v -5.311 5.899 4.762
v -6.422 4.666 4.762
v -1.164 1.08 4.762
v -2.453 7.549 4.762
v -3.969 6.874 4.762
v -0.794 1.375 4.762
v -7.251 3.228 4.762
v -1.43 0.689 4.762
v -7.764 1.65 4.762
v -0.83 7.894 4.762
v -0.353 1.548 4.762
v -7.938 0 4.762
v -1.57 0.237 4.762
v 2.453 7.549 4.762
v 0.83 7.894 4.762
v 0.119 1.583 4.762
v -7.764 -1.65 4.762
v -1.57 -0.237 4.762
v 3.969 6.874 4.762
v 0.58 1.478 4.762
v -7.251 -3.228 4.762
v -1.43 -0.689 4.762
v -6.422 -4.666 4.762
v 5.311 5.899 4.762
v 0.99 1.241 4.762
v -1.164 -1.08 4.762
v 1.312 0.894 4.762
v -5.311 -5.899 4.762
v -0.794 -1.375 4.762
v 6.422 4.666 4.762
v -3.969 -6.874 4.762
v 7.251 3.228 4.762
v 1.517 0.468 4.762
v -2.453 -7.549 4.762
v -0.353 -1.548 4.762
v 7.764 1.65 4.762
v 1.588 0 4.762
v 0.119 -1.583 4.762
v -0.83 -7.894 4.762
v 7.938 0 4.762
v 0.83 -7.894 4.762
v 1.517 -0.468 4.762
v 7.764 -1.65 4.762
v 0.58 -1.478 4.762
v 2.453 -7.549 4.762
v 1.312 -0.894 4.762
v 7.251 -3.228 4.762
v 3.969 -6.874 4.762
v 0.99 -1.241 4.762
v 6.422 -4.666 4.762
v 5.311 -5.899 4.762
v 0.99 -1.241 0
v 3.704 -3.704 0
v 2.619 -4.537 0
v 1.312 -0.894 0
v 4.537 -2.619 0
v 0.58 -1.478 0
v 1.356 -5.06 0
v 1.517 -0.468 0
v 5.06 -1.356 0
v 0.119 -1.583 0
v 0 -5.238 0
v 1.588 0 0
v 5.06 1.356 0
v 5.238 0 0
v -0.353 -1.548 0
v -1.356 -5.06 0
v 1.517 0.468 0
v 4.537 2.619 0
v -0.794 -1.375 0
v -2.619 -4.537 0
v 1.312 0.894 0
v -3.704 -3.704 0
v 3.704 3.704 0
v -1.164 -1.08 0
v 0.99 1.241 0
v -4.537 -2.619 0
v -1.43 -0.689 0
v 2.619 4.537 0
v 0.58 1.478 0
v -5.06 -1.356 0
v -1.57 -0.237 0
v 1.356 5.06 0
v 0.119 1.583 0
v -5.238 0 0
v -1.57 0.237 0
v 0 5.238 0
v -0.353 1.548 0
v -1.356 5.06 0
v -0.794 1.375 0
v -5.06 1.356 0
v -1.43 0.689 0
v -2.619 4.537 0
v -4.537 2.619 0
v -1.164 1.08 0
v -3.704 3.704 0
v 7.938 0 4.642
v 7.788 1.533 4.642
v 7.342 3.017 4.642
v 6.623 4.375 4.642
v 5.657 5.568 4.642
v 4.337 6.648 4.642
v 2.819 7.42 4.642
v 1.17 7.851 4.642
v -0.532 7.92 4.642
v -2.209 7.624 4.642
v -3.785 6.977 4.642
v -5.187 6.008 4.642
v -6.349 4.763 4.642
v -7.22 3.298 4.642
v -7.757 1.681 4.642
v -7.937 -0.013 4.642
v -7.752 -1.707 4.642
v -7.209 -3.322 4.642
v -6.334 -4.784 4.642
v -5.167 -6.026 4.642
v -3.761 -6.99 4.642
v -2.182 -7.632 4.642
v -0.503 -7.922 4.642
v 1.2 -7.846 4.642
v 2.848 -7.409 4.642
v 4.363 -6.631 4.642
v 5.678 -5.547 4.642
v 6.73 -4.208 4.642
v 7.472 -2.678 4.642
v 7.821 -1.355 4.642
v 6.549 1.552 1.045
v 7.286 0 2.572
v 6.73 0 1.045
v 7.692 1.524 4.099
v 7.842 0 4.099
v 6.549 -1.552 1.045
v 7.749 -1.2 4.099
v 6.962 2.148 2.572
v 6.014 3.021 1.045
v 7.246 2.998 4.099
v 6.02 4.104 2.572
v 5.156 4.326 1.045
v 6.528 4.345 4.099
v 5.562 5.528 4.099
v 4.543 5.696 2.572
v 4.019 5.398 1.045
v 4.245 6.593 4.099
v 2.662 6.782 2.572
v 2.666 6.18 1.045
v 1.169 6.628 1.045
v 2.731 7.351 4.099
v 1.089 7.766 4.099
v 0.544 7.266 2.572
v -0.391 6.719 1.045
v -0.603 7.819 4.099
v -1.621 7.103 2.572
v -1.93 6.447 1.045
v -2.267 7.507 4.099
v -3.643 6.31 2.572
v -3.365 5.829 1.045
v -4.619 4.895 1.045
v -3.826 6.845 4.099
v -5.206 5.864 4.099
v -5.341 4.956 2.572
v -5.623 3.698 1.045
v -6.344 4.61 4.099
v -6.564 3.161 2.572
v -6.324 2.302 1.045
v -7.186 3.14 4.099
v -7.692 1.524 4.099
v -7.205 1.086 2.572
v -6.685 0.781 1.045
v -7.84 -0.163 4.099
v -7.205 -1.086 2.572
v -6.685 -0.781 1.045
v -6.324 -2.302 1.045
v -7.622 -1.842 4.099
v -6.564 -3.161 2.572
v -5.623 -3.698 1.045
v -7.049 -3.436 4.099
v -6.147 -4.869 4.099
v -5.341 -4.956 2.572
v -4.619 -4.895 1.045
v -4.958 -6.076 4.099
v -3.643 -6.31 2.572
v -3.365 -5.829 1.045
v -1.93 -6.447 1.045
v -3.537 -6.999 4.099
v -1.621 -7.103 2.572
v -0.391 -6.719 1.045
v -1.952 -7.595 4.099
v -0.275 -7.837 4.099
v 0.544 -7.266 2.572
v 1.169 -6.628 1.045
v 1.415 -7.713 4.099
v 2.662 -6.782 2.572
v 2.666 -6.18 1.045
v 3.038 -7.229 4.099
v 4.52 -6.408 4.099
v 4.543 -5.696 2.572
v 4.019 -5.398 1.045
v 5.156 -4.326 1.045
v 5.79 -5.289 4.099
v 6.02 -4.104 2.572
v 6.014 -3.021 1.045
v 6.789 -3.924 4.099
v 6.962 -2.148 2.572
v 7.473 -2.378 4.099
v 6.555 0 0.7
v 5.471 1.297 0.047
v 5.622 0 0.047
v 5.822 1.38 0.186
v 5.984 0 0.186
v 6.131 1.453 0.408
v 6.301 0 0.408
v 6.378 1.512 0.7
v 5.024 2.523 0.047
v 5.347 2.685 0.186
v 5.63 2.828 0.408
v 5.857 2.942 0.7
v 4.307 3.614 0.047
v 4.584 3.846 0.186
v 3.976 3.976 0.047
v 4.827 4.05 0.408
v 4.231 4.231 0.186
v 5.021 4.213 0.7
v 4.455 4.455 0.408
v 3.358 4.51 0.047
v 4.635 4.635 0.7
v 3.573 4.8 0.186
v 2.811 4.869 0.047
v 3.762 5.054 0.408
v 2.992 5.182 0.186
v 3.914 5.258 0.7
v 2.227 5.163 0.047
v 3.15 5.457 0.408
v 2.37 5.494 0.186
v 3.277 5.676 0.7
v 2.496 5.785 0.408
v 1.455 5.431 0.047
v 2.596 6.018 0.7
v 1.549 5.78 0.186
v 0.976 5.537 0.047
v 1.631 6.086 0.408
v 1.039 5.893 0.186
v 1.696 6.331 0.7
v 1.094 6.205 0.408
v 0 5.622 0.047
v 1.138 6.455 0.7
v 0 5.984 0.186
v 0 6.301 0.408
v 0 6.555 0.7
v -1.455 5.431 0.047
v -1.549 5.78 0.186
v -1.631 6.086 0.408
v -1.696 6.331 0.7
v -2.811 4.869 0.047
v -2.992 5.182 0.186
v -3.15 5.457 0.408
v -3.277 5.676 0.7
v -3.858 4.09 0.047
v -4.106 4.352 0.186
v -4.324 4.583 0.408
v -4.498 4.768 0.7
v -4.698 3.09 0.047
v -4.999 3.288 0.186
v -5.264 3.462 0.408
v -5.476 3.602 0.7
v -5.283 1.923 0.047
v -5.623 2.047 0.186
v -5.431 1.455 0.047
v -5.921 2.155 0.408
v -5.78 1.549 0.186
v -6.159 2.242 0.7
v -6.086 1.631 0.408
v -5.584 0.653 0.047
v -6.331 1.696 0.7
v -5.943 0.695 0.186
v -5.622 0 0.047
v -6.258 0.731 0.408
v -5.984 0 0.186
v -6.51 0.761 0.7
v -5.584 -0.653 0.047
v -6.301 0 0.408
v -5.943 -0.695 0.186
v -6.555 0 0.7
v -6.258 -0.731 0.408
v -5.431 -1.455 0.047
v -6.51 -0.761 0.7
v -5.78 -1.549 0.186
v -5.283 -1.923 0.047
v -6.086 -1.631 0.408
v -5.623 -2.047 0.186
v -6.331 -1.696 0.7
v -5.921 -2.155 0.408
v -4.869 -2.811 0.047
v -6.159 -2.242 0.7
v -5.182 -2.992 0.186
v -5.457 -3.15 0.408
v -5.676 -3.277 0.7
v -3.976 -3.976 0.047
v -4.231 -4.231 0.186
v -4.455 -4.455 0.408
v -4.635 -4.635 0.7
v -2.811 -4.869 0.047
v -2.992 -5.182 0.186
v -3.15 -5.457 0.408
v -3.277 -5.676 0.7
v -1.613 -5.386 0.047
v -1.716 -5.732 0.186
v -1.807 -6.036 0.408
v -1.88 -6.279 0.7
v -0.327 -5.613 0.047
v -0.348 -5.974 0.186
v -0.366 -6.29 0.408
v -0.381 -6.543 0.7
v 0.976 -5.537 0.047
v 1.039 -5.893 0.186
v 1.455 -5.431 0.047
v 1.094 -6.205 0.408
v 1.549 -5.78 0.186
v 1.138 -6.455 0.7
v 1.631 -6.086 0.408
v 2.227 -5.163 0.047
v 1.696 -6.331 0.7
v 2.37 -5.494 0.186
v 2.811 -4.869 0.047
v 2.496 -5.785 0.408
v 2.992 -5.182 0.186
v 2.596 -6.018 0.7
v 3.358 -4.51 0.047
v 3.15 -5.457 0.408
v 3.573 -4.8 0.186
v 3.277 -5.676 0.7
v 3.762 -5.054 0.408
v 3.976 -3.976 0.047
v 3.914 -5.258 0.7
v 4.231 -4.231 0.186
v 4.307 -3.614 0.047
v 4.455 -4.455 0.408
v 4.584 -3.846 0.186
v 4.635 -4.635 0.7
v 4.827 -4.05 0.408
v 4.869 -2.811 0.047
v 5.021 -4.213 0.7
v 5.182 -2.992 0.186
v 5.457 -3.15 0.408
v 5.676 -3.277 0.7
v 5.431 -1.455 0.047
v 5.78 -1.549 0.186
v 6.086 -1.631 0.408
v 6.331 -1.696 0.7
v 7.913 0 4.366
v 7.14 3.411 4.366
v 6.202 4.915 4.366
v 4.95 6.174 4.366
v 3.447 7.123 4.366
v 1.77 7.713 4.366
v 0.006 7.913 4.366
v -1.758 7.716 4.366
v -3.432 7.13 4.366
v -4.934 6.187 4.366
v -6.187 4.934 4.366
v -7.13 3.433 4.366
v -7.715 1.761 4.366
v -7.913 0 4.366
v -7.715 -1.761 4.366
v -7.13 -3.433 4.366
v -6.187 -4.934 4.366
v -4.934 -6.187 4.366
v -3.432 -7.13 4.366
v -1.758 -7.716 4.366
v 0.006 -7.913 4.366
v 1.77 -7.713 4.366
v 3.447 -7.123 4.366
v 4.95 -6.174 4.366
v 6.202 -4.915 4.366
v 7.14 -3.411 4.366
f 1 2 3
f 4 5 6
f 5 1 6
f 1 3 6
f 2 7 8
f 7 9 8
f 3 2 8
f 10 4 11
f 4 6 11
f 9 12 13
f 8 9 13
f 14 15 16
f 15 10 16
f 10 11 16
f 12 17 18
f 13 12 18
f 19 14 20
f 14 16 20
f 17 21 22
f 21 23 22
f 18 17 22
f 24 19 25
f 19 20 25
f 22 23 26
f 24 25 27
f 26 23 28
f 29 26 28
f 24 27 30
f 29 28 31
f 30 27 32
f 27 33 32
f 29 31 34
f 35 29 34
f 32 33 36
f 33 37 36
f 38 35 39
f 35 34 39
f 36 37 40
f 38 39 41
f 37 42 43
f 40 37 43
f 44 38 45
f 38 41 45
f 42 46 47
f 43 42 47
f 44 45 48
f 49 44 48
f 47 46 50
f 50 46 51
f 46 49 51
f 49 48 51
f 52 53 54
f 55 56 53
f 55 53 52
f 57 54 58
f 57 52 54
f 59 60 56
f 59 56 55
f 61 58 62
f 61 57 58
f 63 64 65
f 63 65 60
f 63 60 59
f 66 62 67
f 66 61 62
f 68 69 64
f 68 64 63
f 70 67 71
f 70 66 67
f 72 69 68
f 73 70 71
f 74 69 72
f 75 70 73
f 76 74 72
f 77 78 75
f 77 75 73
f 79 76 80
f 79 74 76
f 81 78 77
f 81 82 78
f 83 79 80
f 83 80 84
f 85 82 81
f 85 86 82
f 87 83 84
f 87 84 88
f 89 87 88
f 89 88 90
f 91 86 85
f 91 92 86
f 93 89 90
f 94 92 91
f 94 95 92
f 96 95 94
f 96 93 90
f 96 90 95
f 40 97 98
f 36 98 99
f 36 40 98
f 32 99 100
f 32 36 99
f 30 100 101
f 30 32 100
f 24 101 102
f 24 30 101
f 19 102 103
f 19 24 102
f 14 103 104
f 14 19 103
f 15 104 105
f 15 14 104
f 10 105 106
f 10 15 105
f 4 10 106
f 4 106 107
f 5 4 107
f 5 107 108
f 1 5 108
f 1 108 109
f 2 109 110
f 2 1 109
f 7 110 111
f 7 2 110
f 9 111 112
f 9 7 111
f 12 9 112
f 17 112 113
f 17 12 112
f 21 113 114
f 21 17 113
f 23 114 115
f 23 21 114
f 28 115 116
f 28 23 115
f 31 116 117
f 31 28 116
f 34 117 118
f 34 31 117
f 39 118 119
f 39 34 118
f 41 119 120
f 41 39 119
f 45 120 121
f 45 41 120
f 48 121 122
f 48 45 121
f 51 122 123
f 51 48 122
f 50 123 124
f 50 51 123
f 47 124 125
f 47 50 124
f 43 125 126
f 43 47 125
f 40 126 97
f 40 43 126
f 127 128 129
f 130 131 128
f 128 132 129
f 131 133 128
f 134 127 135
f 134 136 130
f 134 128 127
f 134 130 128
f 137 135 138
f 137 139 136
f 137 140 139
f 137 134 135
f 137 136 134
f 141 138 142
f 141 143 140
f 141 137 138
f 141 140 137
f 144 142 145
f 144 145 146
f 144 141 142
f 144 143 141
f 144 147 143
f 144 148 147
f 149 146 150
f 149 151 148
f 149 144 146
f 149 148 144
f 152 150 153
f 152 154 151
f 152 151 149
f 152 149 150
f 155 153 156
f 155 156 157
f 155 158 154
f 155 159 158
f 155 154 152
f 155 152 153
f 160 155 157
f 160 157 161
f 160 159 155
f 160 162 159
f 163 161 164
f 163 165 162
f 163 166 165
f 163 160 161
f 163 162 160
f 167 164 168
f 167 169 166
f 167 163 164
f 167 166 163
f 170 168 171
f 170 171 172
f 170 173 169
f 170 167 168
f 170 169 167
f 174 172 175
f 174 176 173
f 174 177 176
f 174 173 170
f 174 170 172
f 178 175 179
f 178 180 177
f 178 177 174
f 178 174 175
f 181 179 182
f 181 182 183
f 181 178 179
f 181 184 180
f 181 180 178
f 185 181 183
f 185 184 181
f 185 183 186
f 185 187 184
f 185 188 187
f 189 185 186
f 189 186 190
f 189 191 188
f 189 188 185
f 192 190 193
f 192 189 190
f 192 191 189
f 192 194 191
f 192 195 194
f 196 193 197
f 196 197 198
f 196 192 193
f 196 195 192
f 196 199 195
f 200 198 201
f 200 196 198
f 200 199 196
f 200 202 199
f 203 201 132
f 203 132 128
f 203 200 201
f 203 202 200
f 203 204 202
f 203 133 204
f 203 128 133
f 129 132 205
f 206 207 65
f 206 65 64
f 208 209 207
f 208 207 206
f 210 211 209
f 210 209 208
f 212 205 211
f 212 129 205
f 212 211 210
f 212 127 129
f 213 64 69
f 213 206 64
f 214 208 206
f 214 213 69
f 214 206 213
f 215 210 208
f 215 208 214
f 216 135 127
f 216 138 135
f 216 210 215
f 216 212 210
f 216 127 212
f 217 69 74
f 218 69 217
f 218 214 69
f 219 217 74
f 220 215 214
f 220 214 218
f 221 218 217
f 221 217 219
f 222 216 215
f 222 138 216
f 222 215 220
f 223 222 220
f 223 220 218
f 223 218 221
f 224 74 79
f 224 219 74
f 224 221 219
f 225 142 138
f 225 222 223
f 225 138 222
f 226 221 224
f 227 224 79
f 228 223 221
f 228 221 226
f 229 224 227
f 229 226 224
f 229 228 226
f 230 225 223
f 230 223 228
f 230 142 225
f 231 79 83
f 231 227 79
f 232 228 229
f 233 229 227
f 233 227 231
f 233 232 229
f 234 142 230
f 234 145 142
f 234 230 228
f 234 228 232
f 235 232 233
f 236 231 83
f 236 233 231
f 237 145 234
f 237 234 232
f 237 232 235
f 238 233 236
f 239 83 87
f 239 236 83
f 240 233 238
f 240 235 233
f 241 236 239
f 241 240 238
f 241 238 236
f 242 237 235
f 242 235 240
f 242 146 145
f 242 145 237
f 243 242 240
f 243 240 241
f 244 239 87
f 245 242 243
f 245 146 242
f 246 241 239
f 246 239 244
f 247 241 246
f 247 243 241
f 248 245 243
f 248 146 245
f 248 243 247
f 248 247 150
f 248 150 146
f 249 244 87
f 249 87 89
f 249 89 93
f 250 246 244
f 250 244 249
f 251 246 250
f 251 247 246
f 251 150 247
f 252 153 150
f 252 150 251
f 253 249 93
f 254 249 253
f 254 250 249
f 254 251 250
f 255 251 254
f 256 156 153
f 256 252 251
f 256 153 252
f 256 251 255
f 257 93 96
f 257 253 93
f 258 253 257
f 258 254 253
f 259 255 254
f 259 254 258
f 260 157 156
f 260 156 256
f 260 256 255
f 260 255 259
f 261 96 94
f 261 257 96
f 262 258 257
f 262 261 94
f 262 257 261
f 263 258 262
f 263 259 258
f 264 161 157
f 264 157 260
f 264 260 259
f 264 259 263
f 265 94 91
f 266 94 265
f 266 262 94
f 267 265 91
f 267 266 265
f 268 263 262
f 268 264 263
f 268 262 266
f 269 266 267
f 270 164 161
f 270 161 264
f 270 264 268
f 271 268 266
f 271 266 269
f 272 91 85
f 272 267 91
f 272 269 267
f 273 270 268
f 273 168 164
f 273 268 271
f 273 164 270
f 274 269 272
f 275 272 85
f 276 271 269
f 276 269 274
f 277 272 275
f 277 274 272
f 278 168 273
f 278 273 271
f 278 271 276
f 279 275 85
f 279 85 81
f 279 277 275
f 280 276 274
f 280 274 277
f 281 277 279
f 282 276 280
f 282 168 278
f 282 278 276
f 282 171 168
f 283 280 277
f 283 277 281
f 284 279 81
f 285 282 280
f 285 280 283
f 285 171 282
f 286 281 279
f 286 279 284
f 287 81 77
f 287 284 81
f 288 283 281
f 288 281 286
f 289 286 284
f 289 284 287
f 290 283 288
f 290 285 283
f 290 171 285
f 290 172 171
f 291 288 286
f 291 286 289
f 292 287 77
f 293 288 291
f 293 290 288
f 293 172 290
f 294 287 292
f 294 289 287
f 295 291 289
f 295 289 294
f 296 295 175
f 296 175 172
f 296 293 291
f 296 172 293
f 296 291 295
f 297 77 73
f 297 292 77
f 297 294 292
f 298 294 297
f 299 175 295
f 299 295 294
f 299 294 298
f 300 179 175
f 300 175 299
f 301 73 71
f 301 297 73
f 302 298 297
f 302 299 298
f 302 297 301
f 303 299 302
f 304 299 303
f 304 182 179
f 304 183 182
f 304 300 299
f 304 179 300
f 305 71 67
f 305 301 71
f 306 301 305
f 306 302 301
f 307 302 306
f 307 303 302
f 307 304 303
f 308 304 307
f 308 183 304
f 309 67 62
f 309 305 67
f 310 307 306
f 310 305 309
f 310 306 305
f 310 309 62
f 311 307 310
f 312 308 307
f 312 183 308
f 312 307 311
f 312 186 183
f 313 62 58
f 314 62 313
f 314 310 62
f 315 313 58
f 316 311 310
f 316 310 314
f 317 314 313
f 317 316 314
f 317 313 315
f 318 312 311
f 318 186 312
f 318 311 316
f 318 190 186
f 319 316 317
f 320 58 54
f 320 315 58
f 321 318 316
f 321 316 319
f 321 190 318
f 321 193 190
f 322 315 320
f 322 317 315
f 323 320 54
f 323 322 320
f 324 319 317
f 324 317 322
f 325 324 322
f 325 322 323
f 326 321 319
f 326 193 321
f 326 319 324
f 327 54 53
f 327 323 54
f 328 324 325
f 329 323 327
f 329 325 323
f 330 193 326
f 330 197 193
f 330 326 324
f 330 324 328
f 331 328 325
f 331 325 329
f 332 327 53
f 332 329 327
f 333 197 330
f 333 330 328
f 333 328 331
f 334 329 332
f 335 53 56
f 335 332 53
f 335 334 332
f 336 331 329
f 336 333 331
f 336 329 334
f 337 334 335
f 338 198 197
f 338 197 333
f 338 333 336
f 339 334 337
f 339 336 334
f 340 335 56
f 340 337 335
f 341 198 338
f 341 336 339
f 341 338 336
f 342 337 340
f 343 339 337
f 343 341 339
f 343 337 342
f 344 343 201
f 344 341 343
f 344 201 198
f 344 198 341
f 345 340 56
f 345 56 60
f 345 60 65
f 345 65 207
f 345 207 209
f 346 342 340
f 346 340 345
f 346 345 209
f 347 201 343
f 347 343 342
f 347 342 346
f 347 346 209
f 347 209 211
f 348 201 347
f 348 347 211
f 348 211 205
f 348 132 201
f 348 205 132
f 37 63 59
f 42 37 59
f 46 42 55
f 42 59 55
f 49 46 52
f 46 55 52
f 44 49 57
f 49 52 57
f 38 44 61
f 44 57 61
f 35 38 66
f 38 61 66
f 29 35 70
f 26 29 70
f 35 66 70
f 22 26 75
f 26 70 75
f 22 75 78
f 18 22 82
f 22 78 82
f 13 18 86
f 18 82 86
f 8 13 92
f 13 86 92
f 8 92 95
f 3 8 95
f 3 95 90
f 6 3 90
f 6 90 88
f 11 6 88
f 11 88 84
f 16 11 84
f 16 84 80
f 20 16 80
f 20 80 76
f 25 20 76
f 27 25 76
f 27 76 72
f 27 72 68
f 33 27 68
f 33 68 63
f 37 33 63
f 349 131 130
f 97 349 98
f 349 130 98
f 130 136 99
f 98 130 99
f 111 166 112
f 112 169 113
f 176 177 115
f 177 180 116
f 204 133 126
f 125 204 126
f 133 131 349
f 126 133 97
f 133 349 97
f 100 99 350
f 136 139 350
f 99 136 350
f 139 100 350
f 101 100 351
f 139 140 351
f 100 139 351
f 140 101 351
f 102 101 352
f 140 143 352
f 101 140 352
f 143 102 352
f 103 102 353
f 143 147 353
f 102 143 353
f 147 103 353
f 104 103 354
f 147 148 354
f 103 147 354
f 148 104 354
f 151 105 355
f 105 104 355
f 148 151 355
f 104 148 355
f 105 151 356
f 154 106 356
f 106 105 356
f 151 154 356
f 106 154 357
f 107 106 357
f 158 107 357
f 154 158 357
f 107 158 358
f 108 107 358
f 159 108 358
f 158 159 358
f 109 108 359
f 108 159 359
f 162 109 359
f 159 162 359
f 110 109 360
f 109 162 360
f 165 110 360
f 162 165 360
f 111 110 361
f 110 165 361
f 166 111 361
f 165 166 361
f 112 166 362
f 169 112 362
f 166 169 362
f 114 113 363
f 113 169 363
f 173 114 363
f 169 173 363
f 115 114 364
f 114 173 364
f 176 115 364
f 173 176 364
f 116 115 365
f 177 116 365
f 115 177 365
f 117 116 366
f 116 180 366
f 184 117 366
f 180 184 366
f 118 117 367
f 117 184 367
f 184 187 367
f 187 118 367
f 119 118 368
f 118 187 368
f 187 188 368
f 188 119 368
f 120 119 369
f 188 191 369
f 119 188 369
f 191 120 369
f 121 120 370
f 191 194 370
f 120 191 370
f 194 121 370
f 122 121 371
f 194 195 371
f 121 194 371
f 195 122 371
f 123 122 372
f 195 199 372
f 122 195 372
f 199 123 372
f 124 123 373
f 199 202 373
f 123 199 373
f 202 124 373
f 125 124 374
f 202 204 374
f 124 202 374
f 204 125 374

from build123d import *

# Parameters (mm, degrees)
F2_R           = 1.5875
F3_W           = 25.4
F3_H           = 15.875
F4_DEPTH       = 12.7
F6_D           = 1.5875
F6_DEPTH       = 19.05
F6_CBORE_D     = 3.175
F6_CBORE_DEPTH = 6.35


with BuildPart() as f1:
    # F0 (on Front) → F1 (revolve)
    with BuildSketch(Plane.XZ):
        Polygon((7.9375, 12.7), (0, 12.7), (0, 0), (6.35, 0), (7.9375, 4.36162), align=None)
    revolve(axis=Axis((0, 0, 6.35), (0, 0, 1)))

    # F2
    f2_edges = [f1.edges().sort_by_distance(p)[0] for p in [
        (-6.35, 0, 0),
        (-7.9375, 0, 4.36162),
    ]]
    fillet(f2_edges, radius=F2_R)

    # F3 (on Front) → F4 (cut, symmetric)
    with BuildSketch(Plane.XZ):
        with Locations((0, 12.7)):
            Rectangle(F3_W, F3_H)
    extrude(amount=F4_DEPTH, both=True, mode=Mode.SUBTRACT)

    # F6
    with Locations(Plane(origin=(0, 0, 0), x_dir=(1, 0, 0), z_dir=(0, 0, -1))):
        with Locations((0, 0)):
            CounterBoreHole(F6_D / 2, F6_CBORE_D / 2, F6_CBORE_DEPTH, depth=F6_DEPTH)


solid = f1.part
